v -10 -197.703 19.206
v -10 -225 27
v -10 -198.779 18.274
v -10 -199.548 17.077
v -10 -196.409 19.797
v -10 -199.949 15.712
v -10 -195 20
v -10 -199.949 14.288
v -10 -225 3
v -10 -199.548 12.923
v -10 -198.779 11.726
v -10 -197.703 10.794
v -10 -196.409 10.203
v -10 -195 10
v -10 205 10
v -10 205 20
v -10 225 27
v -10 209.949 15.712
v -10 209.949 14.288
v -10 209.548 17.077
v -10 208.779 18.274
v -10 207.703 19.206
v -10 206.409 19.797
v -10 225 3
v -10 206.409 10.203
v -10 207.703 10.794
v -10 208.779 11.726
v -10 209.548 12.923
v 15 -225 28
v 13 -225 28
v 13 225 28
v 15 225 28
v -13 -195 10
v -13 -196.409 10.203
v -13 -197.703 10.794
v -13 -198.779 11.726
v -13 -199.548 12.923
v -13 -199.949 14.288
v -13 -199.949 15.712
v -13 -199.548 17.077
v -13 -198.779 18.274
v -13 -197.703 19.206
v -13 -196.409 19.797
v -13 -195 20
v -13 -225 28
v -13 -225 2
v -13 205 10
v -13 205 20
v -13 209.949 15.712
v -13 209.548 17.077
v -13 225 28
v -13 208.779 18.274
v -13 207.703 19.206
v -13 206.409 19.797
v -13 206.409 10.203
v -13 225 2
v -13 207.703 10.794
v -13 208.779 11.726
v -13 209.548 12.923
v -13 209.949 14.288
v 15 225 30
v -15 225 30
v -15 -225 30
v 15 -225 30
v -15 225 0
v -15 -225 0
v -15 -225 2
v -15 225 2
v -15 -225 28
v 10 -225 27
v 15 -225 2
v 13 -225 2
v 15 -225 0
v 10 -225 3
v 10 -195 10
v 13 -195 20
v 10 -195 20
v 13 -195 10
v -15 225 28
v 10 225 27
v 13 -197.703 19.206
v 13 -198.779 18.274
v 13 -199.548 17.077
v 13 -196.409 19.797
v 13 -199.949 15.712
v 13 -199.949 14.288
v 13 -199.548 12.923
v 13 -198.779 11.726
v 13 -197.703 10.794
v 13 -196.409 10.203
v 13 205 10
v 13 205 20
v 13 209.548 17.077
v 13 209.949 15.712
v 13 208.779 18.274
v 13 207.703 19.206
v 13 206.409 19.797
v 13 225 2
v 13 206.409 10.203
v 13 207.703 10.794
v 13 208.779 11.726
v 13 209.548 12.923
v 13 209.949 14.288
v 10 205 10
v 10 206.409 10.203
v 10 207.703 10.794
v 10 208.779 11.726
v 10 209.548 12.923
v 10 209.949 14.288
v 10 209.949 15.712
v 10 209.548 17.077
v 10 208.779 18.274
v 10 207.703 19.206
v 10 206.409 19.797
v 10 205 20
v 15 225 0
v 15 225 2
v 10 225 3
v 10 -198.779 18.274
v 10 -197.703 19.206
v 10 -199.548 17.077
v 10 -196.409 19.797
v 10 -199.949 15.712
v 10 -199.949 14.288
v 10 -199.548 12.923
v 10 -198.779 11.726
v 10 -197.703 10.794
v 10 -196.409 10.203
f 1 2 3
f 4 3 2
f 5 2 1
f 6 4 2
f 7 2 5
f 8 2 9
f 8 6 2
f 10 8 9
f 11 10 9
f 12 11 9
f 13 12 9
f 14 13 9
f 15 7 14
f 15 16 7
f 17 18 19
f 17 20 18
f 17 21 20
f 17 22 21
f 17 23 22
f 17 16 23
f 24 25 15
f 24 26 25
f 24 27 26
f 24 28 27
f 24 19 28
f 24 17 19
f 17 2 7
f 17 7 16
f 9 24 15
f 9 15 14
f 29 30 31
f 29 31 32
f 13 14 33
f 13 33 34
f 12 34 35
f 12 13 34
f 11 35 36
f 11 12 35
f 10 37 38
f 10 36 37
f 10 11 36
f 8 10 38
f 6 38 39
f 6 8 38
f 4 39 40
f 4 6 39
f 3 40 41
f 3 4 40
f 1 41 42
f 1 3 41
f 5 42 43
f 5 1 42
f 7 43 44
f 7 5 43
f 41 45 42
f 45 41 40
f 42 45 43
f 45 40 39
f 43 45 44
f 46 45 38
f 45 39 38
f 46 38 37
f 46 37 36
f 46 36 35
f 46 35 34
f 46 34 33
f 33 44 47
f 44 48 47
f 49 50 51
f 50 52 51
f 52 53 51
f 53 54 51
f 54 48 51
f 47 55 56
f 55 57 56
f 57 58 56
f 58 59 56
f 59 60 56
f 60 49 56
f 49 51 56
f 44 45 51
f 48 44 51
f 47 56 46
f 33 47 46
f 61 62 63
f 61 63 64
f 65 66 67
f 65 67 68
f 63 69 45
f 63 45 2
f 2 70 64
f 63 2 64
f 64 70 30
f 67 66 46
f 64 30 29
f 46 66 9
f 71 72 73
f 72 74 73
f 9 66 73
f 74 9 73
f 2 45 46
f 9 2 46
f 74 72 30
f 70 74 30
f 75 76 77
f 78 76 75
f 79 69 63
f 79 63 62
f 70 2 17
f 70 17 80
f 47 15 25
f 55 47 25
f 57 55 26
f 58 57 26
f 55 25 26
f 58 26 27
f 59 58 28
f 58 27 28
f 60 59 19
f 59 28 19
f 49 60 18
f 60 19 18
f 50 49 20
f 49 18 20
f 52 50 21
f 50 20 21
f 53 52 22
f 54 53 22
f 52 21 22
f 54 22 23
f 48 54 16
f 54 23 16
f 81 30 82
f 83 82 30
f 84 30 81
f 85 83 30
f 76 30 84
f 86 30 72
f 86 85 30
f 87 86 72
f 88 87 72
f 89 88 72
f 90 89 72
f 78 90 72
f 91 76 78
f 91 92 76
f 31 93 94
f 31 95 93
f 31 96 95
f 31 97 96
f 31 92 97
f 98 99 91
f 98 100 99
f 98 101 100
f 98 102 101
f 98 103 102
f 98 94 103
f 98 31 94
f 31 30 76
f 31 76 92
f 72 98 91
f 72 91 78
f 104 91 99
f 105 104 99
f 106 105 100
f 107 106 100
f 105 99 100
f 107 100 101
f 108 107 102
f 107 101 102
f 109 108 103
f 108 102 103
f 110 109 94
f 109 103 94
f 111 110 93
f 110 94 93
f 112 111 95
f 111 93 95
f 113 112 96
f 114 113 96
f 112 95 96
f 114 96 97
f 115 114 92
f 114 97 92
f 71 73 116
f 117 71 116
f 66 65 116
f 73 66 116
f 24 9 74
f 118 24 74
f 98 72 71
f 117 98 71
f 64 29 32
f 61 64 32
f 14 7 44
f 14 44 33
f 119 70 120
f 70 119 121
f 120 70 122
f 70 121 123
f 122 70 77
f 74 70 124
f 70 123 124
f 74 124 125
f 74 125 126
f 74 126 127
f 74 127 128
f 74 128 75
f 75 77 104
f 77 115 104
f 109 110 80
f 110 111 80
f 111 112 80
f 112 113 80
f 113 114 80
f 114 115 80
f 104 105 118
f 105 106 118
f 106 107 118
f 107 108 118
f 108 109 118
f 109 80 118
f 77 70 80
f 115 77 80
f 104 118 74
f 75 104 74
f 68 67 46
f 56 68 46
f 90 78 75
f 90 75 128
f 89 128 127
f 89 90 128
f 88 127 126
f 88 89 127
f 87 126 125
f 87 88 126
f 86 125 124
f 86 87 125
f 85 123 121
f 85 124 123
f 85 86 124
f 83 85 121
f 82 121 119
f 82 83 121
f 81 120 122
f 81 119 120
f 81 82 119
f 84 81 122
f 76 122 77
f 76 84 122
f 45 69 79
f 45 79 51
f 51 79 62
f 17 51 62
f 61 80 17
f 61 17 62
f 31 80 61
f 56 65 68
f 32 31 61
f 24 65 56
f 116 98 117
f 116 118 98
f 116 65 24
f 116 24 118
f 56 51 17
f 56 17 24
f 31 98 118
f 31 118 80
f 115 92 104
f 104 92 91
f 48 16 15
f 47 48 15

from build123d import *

# Parameters (mm, degrees)
SKETCH_1_W          = 30
SKETCH_1_H          = 450
EXTRUDE_1_DEPTH     = 30
SKETCH_2_W          = 2
SKETCH_2_H          = 26
CUT_EXTRUDE_1_DEPTH = 452.248268695
SHELL_1_T           = -3
CUT_EXTRUDE_2_DEPTH = 229.7116088


with BuildPart() as part:
    # 草图1 → 凸台-拉伸1 (new body)
    with BuildSketch(Plane.XY):
        Rectangle(SKETCH_1_W, SKETCH_1_H)
    extrude(amount=EXTRUDE_1_DEPTH)

    # 草图2 → 切除-拉伸1 (cut, through all)
    with BuildSketch(Plane(origin=(0, 225, 0), x_dir=(1, 0, 0), z_dir=(0, 1, 0))):
        with Locations((-14, -15)):
            Rectangle(SKETCH_2_W, SKETCH_2_H)
        with Locations((14, -15)):
            Rectangle(SKETCH_2_W, SKETCH_2_H)
    extrude(amount=-CUT_EXTRUDE_1_DEPTH, mode=Mode.SUBTRACT)

    # 抽壳1
    shell_1_openings = [part.faces().sort_by_distance(p)[0] for p in [
        (0, 225, 15),
        (0, -225, 15),
    ]]
    offset(amount=SHELL_1_T, openings=shell_1_openings)

    # 草图3 → 切除-拉伸2 (cut, through all)
    with BuildSketch(Plane(origin=(13, 0, 0), x_dir=(0, 0, -1), z_dir=(1, 0, 0))):
        with BuildLine():
            Line((-20, 205), (-10, 205))
            ThreePointArc((-10, 205), (-15, 210), (-20, 205))
        make_face()
        with BuildLine():
            Line((-20, -195), (-10, -195))
            ThreePointArc((-10, -195), (-15, -200), (-20, -195))
        make_face()
    extrude(amount=-CUT_EXTRUDE_2_DEPTH, mode=Mode.SUBTRACT)


solid = part.part
